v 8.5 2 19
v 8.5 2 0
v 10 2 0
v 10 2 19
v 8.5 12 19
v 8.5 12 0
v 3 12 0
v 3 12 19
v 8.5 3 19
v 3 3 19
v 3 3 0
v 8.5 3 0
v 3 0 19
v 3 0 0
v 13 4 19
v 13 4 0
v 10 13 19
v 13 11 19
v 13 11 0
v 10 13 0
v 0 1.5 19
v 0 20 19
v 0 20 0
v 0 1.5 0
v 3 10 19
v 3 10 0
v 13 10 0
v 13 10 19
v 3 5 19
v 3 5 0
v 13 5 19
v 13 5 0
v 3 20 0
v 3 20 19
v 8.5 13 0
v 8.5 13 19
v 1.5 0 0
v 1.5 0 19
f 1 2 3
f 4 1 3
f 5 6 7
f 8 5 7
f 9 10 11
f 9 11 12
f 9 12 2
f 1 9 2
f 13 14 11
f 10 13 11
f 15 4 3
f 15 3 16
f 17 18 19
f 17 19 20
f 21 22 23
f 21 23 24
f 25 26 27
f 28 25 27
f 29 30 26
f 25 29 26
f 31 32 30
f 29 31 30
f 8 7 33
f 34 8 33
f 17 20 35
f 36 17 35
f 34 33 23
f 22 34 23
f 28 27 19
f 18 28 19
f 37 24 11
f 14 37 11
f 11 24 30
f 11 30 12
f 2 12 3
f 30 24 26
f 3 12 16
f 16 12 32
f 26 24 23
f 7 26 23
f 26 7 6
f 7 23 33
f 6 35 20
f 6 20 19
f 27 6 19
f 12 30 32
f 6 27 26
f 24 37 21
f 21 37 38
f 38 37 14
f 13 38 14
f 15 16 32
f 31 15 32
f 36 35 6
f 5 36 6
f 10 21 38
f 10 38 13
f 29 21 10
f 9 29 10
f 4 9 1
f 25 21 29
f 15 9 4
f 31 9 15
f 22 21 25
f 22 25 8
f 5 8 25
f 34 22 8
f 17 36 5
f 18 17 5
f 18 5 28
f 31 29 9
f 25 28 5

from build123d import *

# Parameters (mm, degrees)
F1_DEPTH = 19
F2_SIZE  = 1.5


with BuildPart() as f1:
    # F0 (on Top) → F1 (new body)
    with BuildSketch(Plane.XY):
        Polygon((0, 20), (0, 0), (3, 0), (3, 3), (8.5, 3), (8.5, 2), (10, 2), (13, 4), (13, 5), (3, 5), (3, 10), (13, 10), (13, 11), (10, 13), (8.5, 13), (8.5, 12), (3, 12), (3, 20), align=None)
    extrude(amount=F1_DEPTH)

    # F2
    f2_edges = [f1.edges().sort_by_distance(p)[0] for p in [
        (0, 0, 9.5),
    ]]
    chamfer(f2_edges, length=F2_SIZE)


solid = f1.part
